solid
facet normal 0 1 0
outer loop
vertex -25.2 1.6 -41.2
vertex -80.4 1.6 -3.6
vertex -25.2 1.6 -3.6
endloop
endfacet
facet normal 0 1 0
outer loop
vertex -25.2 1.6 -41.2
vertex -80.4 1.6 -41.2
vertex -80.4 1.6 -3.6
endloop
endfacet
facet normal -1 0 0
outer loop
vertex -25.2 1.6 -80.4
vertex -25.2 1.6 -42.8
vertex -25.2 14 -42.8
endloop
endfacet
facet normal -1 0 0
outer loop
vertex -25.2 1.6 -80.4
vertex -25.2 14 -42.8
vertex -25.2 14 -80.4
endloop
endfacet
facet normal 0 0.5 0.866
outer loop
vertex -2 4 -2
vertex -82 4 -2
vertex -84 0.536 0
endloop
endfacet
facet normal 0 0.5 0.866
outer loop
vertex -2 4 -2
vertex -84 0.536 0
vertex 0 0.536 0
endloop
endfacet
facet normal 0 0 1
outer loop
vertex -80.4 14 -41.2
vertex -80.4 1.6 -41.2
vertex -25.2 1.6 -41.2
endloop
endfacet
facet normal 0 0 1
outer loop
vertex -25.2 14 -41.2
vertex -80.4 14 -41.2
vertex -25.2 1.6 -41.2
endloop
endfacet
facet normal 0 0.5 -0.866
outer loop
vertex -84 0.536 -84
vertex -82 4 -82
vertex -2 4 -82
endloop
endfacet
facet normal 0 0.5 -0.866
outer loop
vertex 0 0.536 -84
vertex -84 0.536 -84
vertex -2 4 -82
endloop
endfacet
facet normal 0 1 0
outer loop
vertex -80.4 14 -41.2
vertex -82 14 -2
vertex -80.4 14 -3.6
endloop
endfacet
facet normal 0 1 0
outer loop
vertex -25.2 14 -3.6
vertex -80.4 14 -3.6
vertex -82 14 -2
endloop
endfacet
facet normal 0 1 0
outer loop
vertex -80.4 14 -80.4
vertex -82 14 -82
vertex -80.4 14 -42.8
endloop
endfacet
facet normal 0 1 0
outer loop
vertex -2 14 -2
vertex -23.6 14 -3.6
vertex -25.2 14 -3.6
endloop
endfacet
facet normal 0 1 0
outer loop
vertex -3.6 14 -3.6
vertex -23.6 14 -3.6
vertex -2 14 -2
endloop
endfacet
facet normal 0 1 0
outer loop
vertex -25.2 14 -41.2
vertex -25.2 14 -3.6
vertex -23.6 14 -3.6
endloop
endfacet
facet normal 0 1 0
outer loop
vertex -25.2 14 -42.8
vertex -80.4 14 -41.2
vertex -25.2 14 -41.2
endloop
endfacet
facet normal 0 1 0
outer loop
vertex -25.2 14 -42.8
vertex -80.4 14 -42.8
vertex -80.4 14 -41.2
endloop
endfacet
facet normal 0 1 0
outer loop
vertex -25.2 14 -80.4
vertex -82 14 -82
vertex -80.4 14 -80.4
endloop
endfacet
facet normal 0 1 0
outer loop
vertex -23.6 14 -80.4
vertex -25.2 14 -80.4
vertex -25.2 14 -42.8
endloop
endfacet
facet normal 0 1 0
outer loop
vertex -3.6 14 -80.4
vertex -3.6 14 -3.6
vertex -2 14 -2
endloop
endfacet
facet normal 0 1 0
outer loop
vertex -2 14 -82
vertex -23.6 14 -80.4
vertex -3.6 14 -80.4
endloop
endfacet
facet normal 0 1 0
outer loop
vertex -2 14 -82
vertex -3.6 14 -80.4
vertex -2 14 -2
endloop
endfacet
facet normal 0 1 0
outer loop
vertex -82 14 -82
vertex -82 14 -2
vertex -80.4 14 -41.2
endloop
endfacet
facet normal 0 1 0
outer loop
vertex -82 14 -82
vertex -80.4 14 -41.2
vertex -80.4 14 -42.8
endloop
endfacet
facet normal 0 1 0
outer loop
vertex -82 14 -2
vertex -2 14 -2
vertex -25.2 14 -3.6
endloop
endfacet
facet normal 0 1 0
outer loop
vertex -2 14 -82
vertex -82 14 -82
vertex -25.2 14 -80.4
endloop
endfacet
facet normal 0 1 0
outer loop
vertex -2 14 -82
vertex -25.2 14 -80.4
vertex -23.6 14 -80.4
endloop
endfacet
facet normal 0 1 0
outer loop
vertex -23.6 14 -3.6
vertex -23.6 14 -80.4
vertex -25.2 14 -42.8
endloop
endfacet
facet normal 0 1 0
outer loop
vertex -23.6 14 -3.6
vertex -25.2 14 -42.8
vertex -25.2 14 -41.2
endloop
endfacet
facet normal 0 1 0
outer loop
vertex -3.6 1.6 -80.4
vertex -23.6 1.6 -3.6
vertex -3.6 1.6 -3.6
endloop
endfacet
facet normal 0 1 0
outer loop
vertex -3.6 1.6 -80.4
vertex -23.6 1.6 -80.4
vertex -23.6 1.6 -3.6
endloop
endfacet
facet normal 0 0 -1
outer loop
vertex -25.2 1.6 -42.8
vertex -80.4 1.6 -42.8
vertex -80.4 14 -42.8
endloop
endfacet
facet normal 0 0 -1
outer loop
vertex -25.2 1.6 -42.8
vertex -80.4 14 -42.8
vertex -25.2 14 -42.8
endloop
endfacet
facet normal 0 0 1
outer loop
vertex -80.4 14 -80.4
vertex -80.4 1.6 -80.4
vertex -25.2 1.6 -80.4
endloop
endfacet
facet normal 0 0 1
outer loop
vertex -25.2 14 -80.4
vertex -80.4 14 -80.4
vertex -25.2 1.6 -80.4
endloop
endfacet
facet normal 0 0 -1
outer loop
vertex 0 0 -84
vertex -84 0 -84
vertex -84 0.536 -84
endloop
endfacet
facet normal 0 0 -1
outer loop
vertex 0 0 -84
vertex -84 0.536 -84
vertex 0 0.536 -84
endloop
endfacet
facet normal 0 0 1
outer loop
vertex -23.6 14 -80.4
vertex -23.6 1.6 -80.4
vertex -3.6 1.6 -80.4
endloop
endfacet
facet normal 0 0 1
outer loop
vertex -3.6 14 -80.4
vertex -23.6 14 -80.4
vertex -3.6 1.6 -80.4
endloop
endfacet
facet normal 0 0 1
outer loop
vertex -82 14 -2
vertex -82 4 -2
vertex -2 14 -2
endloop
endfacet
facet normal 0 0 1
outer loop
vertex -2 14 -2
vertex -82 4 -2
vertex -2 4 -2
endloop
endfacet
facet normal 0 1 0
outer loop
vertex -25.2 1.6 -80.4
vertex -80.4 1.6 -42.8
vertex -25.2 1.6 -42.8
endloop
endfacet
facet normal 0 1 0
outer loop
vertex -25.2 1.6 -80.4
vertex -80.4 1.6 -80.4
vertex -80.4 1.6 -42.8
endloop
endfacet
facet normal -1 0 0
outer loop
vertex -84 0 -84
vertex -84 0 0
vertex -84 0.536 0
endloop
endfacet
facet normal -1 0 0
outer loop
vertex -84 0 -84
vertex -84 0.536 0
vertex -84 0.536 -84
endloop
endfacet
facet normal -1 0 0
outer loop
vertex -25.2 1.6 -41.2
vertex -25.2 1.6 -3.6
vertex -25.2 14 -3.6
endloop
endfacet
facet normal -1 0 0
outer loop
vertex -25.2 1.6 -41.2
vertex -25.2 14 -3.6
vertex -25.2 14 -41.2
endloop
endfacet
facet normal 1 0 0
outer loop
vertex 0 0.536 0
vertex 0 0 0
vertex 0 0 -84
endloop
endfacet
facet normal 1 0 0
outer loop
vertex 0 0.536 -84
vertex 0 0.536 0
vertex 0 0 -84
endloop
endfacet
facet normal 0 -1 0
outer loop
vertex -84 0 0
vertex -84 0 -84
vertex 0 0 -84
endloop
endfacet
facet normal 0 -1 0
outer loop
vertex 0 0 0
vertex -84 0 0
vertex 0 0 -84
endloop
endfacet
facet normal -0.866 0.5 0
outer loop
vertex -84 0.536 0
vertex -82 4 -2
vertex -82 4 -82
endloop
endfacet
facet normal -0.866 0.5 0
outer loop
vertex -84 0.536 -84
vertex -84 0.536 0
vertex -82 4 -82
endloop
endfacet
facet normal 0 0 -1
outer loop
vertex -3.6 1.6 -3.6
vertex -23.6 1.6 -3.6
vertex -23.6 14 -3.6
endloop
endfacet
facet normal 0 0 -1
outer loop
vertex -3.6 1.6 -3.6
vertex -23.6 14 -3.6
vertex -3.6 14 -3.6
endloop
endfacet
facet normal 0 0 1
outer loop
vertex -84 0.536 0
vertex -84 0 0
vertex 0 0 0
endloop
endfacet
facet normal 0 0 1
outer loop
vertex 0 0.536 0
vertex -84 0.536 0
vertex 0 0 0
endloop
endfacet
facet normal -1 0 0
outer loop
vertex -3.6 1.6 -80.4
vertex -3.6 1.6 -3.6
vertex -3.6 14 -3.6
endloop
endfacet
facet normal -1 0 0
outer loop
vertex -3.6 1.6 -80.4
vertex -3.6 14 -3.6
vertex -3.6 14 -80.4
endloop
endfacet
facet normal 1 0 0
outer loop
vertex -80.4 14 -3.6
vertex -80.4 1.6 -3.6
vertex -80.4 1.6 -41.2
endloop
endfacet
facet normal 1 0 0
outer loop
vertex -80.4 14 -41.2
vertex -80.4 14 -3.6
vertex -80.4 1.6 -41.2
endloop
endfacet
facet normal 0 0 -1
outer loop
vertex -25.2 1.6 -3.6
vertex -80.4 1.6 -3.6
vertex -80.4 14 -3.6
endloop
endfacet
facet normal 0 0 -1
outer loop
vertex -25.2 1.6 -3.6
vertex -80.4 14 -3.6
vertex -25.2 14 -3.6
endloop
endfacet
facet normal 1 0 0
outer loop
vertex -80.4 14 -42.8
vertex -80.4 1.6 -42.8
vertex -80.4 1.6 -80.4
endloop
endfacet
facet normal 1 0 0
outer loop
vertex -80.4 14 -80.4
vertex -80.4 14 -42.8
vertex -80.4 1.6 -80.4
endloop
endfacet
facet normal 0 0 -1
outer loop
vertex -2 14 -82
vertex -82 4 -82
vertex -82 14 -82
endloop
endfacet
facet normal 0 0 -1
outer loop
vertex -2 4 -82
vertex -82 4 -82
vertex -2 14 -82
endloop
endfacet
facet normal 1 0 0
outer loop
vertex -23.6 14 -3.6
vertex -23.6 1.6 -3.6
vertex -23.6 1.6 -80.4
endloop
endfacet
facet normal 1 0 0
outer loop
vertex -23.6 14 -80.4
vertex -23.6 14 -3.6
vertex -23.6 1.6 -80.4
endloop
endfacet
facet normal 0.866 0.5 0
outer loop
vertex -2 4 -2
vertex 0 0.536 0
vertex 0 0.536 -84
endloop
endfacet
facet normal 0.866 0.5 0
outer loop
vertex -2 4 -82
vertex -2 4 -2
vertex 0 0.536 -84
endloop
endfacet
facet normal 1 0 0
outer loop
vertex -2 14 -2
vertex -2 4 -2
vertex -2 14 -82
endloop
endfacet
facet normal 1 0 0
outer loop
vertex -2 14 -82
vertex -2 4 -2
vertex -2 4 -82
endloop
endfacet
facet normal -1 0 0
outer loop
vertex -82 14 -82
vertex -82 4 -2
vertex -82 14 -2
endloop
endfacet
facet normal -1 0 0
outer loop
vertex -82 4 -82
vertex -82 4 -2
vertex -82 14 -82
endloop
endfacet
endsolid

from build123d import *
from OCP.BRepFilletAPI import BRepFilletAPI_MakeChamfer

# Parameters (mm, degrees)
SKICA1_W                = 84
SKICA1_H                = 84
P_IDAT_VYSUNUT_M1_DEPTH = 1.6
SKICA1_3_W              = 80
SKICA1_3_H              = 80
SKICA1_3_W_2            = 20
SKICA1_3_H_2            = 76.8
SKICA1_3_W_3            = 55.2
SKICA1_3_H_3            = 37.6
P_IDAT_VYSUNUT_M2_DEPTH = 14
SKICA1_4_W              = 84
SKICA1_4_H              = 84
SKICA1_4_W_2            = 80
SKICA1_4_H_2            = 80
P_IDAT_VYSUNUT_M3_DEPTH = 4
ZKOSEN_2_SIZE           = 3.464101615
ZKOSEN_2_SIZE_2         = 2


with BuildPart() as part:
    # Skica1 → Přidat vysunutím1 (new body)
    with BuildSketch(Plane(origin=(0, 0, 0), x_dir=(1, 0, 0), z_dir=(0, 1, 0))):
        with Locations((-42, 42)):
            Rectangle(SKICA1_W, SKICA1_H)
    extrude(amount=P_IDAT_VYSUNUT_M1_DEPTH)

    # Skica1<3> → Přidat vysunutím2 (add)
    with BuildSketch(Plane(origin=(0, 0, 0), x_dir=(1, 0, 0), z_dir=(0, 1, 0))):
        with Locations((-42, 42)):
            Rectangle(SKICA1_3_W, SKICA1_3_H)
        with Locations((-13.6, 42)):
            Rectangle(SKICA1_3_W_2, SKICA1_3_H_2, mode=Mode.SUBTRACT)
        with Locations((-52.8, 61.6)):
            Rectangle(SKICA1_3_W_3, SKICA1_3_H_3, mode=Mode.SUBTRACT)
        with Locations((-52.8, 22.4)):
            Rectangle(SKICA1_3_W_3, SKICA1_3_H_3, mode=Mode.SUBTRACT)
    extrude(amount=P_IDAT_VYSUNUT_M2_DEPTH)

    # Skica1<4> → Přidat vysunutím3 (add)
    with BuildSketch(Plane(origin=(0, 0, 0), x_dir=(1, 0, 0), z_dir=(0, 1, 0))):
        with Locations((-42, 42)):
            Rectangle(SKICA1_4_W, SKICA1_4_H)
        with Locations((-42, 42)):
            Rectangle(SKICA1_4_W_2, SKICA1_4_H_2, mode=Mode.SUBTRACT)
    extrude(amount=P_IDAT_VYSUNUT_M3_DEPTH)

    # Zkosení2
    zkosen_2_edges_1 = [part.edges().sort_by_distance(p)[0] for p in [
        (-84, 4, -42),
    ]]
    zkosen_2_side_1 = [part.faces().sort_by_distance(p)[0] for p in [
        (-84, 3.96, -42),
    ]]
    zkosen_2_edges_2 = [part.edges().sort_by_distance(p)[0] for p in [
        (-42, 4, 0),
    ]]
    zkosen_2_side_2 = [part.faces().sort_by_distance(p)[0] for p in [
        (-42, 3.96, 0),
    ]]
    zkosen_2_edges_3 = [part.edges().sort_by_distance(p)[0] for p in [
        (0, 4, -42),
    ]]
    zkosen_2_side_3 = [part.faces().sort_by_distance(p)[0] for p in [
        (-0.04, 4, -42),
    ]]
    zkosen_2_edges_4 = [part.edges().sort_by_distance(p)[0] for p in [
        (-42, 4, -84),
    ]]
    zkosen_2_side_4 = [part.faces().sort_by_distance(p)[0] for p in [
        (-42, 3.96, -84),
    ]]
    zkosen_2 = BRepFilletAPI_MakeChamfer(part.part.solid().wrapped)
    for e in zkosen_2_edges_1:
        zkosen_2.Add(ZKOSEN_2_SIZE - 0.0001, ZKOSEN_2_SIZE_2 - 0.0001, e.wrapped, zkosen_2_side_1[0].wrapped)
    for e in zkosen_2_edges_2:
        zkosen_2.Add(ZKOSEN_2_SIZE - 0.0001, ZKOSEN_2_SIZE_2 - 0.0001, e.wrapped, zkosen_2_side_2[0].wrapped)
    for e in zkosen_2_edges_3:
        zkosen_2.Add(ZKOSEN_2_SIZE_2 - 0.0001, ZKOSEN_2_SIZE - 0.0001, e.wrapped, zkosen_2_side_3[0].wrapped)
    for e in zkosen_2_edges_4:
        zkosen_2.Add(ZKOSEN_2_SIZE - 0.0001, ZKOSEN_2_SIZE_2 - 0.0001, e.wrapped, zkosen_2_side_4[0].wrapped)
    add(Compound.cast(zkosen_2.Shape()), mode=Mode.REPLACE)  # a hair under: the kernel refuses the full size


solid = part.part
